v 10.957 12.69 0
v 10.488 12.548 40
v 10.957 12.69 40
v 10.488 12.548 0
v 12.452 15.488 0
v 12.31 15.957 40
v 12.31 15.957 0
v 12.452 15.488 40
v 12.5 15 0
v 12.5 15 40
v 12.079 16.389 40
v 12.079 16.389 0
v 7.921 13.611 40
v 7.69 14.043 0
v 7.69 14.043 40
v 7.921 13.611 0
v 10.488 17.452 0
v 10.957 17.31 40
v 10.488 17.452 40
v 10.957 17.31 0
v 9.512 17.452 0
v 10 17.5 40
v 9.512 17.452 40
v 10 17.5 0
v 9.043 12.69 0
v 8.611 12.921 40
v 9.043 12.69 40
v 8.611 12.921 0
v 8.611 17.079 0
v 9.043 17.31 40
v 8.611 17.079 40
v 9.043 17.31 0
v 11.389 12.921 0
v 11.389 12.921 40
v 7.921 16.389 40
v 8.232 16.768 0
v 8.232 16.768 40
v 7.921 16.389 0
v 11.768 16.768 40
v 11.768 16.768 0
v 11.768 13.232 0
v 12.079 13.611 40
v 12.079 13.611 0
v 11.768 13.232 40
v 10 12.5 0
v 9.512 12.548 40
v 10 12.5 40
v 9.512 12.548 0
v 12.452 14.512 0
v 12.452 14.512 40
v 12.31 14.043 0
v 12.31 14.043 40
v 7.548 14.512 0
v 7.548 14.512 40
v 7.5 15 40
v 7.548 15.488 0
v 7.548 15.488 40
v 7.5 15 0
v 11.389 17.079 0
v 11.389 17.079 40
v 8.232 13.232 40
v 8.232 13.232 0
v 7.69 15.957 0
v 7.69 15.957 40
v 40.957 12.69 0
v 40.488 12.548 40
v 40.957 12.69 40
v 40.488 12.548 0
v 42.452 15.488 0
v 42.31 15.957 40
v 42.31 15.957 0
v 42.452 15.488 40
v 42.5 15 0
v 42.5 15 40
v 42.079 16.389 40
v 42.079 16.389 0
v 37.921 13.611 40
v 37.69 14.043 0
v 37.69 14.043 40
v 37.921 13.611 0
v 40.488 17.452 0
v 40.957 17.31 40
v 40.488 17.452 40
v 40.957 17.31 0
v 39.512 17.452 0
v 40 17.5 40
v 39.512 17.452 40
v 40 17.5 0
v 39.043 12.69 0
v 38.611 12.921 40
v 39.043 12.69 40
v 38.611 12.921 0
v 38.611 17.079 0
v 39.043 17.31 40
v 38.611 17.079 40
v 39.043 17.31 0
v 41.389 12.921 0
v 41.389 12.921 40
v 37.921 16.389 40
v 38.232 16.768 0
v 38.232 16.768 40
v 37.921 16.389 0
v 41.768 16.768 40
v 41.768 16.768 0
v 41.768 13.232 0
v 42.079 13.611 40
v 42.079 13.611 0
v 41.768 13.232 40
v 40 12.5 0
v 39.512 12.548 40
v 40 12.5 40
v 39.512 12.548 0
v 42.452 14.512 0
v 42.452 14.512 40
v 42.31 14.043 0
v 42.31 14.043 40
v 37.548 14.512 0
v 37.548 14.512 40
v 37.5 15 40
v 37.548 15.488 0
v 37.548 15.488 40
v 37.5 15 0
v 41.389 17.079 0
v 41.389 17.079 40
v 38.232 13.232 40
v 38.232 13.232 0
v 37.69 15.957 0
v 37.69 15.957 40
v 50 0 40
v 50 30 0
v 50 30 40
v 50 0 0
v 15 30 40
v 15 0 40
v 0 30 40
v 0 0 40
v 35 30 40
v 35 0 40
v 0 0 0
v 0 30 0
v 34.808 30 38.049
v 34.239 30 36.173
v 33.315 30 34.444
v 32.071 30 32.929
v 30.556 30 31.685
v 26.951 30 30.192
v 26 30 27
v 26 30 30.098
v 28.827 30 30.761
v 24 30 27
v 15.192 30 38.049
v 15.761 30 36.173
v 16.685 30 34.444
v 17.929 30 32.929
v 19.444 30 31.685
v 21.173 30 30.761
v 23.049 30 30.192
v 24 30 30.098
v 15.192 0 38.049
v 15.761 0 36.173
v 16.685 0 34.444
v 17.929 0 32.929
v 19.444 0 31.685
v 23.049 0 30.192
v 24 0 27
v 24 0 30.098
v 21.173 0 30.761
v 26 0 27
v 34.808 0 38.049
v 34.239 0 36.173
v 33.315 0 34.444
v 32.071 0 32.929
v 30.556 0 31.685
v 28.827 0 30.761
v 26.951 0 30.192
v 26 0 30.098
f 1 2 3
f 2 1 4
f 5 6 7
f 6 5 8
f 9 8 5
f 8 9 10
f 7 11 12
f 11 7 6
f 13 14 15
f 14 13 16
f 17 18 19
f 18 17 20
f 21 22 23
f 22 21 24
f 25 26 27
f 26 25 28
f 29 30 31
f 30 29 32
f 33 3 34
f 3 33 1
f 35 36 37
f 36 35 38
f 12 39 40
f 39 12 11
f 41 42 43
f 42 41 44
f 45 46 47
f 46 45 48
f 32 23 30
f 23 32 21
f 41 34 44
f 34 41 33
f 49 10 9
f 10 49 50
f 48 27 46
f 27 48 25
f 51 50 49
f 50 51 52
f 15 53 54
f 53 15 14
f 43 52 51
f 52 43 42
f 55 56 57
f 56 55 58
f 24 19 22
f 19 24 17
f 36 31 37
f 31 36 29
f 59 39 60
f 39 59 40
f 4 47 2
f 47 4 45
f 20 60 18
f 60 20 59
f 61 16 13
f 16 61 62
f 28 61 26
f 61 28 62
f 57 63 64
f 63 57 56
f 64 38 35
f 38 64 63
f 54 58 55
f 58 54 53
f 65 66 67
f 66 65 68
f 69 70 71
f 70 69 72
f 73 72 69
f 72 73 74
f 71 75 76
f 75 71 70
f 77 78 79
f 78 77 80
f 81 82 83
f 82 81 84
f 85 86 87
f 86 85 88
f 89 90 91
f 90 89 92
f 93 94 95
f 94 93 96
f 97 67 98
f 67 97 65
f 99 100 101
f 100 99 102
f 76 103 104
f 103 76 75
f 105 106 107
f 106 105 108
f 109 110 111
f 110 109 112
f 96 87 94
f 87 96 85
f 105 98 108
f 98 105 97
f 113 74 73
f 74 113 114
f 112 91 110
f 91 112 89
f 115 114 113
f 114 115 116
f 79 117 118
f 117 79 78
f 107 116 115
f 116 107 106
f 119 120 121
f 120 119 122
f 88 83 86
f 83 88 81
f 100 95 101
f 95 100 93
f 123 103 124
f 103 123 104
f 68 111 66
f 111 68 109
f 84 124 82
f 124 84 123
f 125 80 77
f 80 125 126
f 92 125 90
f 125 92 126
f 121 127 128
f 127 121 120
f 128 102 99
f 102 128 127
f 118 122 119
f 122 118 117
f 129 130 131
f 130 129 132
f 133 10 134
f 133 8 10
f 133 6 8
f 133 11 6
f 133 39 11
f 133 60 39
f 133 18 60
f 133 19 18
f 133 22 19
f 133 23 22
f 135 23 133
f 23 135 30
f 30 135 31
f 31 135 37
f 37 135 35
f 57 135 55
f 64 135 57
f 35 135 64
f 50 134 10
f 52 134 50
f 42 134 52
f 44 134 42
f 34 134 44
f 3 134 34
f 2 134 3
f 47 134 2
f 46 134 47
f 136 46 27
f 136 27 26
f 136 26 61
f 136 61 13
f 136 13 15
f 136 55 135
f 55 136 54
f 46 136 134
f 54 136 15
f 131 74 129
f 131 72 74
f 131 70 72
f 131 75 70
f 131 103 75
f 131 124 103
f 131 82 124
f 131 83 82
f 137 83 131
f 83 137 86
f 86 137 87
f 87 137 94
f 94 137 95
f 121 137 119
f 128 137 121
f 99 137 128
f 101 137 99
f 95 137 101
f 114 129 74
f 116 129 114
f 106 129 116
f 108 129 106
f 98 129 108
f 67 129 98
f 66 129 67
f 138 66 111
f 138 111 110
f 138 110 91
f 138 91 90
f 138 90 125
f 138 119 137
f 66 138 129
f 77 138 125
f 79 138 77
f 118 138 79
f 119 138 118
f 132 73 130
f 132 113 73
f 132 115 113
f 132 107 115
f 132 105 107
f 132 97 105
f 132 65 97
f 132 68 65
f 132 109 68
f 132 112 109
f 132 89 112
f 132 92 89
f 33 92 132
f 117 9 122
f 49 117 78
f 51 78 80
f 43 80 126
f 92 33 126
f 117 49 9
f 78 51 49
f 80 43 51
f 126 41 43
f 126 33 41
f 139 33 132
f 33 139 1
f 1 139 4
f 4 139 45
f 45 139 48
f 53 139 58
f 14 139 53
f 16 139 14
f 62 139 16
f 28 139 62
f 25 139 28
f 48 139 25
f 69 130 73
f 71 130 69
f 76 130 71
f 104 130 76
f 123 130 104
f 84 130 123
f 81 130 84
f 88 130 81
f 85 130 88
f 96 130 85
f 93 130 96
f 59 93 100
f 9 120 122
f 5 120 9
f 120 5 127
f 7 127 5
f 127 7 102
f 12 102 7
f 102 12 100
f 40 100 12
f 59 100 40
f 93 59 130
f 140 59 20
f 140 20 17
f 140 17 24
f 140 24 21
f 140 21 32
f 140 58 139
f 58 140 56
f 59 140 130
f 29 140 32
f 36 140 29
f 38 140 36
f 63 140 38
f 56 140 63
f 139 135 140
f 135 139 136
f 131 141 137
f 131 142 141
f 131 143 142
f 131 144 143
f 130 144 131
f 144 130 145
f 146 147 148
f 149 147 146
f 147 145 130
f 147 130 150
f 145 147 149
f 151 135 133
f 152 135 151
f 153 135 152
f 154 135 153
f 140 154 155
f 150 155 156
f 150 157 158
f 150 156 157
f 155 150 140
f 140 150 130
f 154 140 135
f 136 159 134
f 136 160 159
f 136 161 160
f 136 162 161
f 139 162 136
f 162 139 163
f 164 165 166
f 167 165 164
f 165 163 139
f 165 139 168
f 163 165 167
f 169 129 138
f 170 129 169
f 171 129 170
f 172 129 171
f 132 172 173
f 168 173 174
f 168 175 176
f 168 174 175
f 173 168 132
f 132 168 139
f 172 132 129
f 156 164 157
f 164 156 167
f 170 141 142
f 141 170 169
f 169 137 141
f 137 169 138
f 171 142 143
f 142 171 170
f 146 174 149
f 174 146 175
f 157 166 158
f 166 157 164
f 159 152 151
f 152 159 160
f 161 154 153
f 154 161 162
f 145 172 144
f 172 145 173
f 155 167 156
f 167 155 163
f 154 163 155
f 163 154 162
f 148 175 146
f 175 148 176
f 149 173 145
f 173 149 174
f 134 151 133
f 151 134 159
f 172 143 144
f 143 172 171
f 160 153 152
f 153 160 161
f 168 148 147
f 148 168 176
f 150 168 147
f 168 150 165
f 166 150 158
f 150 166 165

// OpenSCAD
$fn = 32;

// ----------------------------------------------------------------------
// Saddle clamp: split shaft clamp
// ----------------------------------------------------------------------

// --- parameters (mm) ---
blk_l = 50;               // block length, X
blk_w = 30;               // block width, Y
blk_h = 40;               // block height
clamp_r = 10;             // shaft groove radius
hole_r = 2.5;             // bolt hole radius
hole_m = 10;              // bolt hole margin from the ends
saw_w = 2;                // saw kerf width

saw_depth = clamp_r + 3;  // saw kerf depth

difference() {
  cube([blk_l, blk_w, blk_h]);
  translate([blk_l / 2, -1, blk_h])
    rotate([-90, 0, 0])
      cylinder(h = blk_w + 2, r = clamp_r);
  for (sx = [0, 1])
    translate([sx ? blk_l - hole_m : hole_m, blk_w / 2, -1])
      cylinder(r = hole_r, h = blk_h + 2);
  translate([blk_l / 2 - saw_w / 2, -1, blk_h - saw_depth])
    cube([saw_w, blk_w + 2, saw_depth + 1]);
}
